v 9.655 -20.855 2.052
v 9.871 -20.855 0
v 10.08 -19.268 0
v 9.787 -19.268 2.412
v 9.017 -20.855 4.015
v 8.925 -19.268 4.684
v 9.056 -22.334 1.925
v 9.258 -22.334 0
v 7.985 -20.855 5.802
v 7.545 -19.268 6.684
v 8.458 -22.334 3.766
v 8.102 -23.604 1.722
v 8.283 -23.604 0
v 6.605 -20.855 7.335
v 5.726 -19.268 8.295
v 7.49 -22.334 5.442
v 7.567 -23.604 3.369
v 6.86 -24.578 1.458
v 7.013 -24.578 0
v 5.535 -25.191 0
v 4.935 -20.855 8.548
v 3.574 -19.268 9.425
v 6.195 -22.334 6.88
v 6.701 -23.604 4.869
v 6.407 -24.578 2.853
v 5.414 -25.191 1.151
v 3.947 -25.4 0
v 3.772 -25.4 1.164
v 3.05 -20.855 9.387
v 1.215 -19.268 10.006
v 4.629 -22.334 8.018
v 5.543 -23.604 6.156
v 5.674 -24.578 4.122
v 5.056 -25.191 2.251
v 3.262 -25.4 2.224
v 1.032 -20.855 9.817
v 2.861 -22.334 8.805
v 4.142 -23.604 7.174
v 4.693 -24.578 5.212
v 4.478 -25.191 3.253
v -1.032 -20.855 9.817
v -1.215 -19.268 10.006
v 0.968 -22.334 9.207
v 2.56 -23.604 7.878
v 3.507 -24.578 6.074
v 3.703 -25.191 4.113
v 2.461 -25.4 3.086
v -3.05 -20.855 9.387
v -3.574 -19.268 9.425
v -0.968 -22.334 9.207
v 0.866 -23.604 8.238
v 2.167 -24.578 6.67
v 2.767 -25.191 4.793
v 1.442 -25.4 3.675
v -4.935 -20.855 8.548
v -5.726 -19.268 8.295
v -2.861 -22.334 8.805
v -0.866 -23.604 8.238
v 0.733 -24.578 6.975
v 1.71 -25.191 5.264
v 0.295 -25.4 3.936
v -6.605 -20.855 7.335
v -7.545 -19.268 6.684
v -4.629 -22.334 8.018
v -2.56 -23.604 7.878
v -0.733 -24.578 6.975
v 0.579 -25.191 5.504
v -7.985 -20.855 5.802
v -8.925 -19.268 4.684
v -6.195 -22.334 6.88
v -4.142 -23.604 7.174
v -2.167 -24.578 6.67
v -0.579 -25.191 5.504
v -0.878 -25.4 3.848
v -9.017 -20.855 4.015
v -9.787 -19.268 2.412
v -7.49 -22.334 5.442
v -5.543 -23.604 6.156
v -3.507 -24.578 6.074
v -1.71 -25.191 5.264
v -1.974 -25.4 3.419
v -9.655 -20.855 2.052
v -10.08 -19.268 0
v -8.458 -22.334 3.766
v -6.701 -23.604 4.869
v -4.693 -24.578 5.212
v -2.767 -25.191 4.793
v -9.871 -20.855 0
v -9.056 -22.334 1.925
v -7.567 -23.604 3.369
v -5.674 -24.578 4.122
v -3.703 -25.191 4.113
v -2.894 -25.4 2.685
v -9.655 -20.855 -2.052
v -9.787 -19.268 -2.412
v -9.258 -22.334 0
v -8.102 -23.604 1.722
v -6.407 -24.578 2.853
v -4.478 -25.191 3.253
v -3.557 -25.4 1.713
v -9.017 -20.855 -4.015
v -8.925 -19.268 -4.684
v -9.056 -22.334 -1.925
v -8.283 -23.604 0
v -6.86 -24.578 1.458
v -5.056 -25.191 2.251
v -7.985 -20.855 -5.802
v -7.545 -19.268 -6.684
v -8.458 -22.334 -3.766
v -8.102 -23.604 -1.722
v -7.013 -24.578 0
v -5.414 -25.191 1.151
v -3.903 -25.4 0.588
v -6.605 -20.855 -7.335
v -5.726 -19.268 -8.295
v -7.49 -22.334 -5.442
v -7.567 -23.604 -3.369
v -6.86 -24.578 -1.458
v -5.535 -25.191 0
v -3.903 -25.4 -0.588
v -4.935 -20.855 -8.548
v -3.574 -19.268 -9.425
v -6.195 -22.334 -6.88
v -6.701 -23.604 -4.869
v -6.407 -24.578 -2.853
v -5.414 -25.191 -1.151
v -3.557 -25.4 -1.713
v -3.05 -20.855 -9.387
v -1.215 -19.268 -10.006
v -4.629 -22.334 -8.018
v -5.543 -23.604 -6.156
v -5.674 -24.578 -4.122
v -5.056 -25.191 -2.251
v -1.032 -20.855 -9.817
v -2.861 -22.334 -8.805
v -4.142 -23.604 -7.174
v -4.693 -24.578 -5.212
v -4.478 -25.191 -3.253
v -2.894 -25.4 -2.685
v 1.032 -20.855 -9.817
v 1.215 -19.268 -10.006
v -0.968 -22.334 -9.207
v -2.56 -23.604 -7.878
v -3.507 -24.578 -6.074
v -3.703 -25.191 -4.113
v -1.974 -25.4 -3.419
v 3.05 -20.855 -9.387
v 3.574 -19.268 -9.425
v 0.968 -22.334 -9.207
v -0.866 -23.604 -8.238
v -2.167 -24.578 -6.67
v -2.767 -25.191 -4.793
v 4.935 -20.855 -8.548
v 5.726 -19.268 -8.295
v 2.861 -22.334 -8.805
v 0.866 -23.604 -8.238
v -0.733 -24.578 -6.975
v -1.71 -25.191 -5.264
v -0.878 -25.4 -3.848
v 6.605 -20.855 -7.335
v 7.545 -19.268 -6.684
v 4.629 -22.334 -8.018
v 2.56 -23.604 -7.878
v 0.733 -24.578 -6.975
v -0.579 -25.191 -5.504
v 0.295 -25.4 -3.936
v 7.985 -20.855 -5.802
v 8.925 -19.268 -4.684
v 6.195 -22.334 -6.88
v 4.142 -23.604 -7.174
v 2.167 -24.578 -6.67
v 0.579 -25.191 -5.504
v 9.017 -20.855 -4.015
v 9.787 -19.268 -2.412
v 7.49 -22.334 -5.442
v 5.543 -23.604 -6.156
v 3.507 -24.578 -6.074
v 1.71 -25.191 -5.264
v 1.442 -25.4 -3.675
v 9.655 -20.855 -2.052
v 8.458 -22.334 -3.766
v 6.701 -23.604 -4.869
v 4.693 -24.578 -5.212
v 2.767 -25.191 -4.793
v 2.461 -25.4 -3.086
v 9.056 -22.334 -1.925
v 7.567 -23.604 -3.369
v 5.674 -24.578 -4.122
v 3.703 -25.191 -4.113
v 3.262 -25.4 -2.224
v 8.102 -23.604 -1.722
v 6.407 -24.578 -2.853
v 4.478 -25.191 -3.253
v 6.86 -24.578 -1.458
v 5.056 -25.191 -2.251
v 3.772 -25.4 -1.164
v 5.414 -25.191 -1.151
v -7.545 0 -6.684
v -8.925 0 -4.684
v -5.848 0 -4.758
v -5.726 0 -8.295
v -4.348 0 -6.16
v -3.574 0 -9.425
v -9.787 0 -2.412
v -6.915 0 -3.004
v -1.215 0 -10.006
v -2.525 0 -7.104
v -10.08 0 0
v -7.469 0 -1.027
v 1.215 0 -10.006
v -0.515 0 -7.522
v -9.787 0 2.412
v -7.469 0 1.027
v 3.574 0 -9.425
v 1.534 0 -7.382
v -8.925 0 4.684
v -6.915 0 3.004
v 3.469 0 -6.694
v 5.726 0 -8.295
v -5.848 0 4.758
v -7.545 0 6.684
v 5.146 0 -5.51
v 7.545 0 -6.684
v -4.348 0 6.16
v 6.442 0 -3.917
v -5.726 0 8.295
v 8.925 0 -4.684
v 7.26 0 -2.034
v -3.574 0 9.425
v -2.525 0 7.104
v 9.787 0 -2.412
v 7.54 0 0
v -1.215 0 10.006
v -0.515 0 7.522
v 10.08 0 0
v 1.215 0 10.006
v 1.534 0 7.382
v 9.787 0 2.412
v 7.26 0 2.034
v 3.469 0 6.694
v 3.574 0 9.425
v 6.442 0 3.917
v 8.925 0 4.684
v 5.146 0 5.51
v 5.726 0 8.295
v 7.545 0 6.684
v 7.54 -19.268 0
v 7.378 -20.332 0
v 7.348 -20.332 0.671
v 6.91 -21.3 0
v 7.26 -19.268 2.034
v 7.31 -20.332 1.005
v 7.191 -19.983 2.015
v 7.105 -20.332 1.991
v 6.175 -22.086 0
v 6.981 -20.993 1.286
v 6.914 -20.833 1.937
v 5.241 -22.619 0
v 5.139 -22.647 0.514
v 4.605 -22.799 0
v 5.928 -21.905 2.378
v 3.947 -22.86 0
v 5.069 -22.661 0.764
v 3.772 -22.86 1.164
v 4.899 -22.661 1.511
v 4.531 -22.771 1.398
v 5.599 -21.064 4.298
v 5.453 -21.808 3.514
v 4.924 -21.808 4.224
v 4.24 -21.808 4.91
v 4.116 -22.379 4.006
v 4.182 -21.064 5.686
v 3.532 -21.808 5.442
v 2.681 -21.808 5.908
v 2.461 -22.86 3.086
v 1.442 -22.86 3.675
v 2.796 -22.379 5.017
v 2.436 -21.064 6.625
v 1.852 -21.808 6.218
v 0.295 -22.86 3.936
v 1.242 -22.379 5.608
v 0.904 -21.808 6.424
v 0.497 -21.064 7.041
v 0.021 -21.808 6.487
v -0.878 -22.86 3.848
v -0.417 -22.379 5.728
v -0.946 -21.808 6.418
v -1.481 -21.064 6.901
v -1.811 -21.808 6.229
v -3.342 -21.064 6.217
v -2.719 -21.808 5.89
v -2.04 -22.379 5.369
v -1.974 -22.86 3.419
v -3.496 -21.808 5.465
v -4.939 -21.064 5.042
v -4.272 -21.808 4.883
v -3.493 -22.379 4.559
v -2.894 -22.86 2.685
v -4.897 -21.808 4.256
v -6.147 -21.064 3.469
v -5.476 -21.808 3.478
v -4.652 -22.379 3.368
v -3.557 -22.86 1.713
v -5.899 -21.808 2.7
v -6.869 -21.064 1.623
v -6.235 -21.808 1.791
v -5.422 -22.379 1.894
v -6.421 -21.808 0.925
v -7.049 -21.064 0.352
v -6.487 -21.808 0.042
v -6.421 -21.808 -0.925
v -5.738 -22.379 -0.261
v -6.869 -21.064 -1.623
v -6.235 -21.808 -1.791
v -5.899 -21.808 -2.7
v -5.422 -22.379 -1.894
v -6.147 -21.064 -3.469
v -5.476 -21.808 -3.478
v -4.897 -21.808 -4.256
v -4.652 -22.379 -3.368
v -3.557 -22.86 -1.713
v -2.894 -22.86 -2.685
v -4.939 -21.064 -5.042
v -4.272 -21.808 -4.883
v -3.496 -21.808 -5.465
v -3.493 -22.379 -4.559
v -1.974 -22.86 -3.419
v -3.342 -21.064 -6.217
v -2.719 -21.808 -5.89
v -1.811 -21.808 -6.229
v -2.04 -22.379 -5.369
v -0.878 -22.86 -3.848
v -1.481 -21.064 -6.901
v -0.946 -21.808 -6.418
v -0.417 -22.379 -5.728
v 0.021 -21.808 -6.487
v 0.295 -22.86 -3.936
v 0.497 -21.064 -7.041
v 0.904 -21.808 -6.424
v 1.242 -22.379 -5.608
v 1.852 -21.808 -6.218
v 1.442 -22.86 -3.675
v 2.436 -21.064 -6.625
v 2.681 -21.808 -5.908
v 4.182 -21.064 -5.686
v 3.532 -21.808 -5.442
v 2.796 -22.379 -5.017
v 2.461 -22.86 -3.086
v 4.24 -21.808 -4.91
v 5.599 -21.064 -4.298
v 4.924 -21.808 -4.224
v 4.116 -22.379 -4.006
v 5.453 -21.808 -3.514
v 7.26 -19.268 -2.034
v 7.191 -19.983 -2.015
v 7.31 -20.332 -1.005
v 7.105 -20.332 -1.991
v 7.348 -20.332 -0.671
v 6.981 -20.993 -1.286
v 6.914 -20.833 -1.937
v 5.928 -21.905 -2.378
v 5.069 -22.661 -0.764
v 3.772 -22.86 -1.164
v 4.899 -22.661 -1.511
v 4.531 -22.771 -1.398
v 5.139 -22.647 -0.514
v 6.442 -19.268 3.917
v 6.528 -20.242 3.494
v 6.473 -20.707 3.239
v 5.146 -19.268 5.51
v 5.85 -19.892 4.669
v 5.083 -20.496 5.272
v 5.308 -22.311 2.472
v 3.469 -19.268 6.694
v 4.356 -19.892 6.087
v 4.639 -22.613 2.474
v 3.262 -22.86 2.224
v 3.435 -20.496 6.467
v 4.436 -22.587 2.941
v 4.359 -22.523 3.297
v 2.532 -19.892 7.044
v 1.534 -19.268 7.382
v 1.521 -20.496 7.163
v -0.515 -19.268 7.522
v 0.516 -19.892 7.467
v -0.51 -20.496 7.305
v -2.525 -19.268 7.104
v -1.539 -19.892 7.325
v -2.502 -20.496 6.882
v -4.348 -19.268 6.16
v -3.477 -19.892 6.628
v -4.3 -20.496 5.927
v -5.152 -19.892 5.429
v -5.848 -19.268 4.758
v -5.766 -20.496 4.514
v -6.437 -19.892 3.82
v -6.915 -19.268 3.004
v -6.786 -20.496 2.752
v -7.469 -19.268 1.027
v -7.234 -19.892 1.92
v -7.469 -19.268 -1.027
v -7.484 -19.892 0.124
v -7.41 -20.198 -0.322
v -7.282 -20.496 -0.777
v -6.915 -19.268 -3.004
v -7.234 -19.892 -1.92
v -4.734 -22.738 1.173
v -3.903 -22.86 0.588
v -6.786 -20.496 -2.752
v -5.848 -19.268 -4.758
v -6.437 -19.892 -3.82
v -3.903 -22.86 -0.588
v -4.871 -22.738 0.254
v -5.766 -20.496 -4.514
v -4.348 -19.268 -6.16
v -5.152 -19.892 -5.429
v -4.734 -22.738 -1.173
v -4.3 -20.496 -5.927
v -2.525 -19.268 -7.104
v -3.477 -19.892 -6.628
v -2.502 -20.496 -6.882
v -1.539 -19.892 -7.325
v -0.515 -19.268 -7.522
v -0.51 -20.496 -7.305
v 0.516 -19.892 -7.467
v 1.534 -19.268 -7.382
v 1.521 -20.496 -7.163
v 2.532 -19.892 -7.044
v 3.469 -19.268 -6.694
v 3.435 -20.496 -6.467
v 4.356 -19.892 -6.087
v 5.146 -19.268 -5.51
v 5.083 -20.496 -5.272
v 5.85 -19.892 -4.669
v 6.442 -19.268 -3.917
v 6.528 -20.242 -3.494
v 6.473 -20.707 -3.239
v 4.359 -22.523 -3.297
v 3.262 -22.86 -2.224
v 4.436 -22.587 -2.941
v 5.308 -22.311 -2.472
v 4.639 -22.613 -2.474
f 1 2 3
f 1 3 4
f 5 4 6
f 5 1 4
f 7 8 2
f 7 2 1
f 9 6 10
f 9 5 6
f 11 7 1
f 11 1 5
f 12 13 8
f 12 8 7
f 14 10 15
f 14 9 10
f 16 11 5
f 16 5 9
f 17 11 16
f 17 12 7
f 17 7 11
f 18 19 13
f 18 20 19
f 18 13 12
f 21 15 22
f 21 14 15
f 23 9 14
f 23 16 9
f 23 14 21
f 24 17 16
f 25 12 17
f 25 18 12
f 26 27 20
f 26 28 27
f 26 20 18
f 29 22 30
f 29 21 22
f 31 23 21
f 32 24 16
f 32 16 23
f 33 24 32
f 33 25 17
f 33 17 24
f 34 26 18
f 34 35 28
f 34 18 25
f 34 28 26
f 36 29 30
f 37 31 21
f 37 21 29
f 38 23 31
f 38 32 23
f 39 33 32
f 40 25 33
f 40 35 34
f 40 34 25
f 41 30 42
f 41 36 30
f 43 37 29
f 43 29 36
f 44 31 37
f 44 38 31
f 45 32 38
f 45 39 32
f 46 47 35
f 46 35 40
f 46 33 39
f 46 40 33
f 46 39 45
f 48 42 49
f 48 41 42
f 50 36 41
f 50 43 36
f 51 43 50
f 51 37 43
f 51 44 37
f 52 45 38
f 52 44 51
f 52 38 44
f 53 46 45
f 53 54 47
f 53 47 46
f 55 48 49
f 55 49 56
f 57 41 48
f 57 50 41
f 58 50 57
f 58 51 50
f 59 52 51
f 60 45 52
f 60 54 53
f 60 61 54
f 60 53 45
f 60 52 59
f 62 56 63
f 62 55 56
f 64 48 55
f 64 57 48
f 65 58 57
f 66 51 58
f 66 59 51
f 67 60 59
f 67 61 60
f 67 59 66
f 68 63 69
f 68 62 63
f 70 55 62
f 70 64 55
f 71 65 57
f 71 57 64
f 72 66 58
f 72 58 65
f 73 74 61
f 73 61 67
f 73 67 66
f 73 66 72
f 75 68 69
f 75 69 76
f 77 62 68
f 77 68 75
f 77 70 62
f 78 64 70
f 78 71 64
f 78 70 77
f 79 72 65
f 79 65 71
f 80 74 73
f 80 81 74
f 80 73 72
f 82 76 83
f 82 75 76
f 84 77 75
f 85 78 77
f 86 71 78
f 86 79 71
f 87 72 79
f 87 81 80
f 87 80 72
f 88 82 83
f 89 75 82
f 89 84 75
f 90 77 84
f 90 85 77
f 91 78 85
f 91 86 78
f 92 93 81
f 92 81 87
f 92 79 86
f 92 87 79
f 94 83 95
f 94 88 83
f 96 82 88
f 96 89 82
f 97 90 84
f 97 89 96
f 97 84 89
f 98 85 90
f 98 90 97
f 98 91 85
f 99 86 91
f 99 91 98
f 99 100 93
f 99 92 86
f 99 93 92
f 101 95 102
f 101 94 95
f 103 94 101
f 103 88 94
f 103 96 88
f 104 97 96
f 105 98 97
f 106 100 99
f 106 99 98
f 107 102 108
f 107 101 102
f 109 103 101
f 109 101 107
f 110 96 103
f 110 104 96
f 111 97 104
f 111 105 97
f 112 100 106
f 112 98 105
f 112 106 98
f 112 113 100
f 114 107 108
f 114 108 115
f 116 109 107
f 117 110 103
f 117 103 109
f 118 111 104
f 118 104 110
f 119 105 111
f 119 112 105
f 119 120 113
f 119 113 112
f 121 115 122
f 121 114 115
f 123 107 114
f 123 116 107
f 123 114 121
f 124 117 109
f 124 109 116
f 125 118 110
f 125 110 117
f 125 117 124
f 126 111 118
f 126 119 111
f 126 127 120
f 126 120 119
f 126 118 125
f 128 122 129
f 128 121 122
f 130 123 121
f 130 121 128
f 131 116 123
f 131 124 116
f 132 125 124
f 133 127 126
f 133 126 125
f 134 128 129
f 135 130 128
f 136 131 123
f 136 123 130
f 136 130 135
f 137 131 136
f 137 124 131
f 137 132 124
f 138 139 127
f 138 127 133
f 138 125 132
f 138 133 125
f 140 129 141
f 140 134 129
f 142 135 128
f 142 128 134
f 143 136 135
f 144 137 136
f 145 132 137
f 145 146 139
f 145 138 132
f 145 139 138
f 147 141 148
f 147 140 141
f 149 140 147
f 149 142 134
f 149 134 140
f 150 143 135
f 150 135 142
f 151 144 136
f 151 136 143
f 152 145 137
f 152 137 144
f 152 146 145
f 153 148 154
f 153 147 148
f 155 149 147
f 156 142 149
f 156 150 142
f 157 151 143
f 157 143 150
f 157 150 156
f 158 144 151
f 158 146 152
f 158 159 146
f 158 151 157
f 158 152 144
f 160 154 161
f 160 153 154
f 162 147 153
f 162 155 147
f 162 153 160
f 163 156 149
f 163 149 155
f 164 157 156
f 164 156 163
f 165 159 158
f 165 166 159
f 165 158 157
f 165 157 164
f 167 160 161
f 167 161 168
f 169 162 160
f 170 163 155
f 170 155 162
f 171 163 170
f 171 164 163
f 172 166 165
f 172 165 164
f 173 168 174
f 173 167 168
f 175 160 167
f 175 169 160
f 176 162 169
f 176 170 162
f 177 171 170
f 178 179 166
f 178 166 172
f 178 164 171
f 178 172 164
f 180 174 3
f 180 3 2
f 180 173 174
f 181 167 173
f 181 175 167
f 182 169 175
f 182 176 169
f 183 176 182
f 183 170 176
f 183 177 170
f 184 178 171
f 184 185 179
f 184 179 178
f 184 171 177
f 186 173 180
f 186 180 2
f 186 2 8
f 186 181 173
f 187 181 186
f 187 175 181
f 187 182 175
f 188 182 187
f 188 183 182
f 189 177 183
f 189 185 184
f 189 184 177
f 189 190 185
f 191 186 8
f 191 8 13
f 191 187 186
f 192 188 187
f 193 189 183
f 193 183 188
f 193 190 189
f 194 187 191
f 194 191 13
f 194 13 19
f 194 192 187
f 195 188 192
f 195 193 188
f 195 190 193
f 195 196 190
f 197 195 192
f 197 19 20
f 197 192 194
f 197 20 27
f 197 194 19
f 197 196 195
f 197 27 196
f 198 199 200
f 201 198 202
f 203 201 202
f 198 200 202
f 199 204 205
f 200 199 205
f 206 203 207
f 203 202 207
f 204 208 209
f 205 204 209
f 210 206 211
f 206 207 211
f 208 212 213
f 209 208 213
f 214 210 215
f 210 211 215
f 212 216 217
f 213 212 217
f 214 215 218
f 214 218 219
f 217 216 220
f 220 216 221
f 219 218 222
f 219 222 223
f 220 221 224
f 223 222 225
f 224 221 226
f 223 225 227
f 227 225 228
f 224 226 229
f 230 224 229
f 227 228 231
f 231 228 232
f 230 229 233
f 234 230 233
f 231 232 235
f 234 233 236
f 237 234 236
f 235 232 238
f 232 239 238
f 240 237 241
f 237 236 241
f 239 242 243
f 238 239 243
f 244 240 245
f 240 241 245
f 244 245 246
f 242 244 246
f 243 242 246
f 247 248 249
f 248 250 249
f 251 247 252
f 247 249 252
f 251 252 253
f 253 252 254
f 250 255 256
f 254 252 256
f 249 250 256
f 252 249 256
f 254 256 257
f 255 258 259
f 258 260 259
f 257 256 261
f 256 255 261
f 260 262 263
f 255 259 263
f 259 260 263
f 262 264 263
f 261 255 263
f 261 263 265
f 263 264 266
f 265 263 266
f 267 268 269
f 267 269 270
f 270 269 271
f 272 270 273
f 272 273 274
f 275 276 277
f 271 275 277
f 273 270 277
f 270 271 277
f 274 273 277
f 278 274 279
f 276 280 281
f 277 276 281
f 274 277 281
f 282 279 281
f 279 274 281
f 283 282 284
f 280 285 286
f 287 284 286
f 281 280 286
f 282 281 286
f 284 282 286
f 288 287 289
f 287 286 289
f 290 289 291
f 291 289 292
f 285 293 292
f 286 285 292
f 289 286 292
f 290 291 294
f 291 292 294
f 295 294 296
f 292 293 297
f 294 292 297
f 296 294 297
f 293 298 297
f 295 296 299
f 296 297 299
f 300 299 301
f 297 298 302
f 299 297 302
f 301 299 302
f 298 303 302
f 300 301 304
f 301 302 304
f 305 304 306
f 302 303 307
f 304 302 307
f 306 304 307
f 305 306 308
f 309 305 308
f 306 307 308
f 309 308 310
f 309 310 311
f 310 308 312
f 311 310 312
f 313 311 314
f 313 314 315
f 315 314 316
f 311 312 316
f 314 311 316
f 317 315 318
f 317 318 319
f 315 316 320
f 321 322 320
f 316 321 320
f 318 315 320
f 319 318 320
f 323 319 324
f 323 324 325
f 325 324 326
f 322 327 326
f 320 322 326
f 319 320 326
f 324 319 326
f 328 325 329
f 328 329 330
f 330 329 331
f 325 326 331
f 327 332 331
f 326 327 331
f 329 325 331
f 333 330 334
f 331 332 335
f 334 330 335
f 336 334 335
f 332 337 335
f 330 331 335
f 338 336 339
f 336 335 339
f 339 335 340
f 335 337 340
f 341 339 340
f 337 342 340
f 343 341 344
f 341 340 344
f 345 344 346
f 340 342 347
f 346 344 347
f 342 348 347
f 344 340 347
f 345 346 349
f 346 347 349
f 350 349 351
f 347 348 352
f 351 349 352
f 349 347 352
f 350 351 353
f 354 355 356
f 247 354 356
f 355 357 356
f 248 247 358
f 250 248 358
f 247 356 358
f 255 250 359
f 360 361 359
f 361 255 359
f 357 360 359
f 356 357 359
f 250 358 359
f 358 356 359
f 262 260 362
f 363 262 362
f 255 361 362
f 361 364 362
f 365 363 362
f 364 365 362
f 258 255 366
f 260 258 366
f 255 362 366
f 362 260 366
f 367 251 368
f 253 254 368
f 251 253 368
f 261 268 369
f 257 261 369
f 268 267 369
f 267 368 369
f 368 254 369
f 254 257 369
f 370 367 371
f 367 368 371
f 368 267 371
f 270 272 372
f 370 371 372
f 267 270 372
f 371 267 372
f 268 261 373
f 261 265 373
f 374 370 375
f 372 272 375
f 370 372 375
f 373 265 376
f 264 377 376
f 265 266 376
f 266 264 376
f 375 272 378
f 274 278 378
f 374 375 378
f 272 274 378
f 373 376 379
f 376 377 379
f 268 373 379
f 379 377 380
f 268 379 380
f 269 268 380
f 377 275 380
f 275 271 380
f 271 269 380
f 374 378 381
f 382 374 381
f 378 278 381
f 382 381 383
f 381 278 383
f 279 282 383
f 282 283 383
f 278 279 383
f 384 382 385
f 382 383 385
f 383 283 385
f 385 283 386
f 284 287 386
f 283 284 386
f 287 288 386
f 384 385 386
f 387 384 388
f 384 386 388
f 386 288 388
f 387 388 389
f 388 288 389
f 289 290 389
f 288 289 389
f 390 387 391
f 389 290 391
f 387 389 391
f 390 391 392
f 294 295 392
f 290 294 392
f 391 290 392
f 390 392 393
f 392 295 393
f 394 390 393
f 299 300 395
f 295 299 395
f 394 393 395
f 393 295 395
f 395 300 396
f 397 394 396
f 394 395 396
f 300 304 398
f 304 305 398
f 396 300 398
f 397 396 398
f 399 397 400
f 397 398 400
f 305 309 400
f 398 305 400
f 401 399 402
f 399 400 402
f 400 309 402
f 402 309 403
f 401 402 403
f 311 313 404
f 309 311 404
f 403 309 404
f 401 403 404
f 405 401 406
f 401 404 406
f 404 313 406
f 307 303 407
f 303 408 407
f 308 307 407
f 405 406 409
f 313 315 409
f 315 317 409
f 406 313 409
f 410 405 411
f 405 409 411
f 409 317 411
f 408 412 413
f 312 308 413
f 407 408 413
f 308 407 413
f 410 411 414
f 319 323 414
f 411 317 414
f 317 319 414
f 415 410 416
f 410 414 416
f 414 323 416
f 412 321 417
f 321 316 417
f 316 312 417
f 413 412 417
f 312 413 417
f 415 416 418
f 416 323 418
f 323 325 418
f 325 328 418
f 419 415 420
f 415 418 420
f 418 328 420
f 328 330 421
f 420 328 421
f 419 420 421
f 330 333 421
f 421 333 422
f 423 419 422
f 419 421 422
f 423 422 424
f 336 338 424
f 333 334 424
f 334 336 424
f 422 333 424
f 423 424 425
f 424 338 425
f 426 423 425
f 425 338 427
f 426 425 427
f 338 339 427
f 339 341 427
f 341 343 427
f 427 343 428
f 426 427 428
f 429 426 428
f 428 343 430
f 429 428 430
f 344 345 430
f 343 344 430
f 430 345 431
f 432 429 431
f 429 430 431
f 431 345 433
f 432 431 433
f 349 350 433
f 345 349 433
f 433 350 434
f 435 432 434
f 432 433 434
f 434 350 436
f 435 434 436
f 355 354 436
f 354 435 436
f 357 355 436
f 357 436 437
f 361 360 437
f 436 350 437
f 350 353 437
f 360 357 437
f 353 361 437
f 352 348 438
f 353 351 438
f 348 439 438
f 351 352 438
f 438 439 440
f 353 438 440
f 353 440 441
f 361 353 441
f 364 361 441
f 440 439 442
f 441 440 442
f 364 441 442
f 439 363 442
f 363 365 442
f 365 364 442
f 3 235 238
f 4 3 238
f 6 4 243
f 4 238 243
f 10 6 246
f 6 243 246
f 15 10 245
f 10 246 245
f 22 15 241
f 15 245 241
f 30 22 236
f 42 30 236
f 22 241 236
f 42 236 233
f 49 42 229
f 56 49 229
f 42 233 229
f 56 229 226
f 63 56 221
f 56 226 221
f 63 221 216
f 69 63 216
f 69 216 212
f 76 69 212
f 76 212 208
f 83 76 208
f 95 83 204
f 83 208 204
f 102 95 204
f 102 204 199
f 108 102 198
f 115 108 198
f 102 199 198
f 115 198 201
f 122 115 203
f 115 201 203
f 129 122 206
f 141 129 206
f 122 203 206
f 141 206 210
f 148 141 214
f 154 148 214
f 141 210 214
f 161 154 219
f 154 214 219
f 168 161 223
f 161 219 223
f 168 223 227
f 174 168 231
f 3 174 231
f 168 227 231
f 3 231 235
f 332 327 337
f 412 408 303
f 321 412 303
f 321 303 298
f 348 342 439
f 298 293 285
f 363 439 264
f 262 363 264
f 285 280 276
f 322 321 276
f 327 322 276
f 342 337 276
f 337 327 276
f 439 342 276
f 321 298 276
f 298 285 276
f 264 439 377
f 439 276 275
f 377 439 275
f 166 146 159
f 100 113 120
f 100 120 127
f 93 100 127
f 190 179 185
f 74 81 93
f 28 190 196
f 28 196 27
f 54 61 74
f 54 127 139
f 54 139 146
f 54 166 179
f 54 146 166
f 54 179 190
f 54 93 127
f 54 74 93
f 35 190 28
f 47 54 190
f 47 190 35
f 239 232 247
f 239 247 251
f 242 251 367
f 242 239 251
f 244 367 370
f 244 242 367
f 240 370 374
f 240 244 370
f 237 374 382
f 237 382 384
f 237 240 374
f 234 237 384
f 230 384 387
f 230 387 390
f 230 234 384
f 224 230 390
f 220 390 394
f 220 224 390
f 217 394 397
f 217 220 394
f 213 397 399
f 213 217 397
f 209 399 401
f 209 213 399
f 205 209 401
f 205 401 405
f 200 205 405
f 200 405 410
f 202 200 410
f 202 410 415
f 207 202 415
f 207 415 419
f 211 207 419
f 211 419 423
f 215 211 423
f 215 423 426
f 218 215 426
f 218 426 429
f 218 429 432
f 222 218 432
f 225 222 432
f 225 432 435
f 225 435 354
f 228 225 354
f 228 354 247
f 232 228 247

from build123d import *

# Parameters (mm, degrees)
F0_R     = 10.079521
F1_DEPTH = 25.4
F2_R     = 6.132102
F3_T     = -2.54


with BuildPart() as f1:
    # F0 (on Front) → F1 (new body)
    with BuildSketch(Plane.XZ):
        Circle(F0_R)
    extrude(amount=F1_DEPTH)

    # F2
    f2_edges = [f1.edges().sort_by_distance(p)[0] for p in [
        (-10.079521, -25.4, 0),
    ]]
    fillet(f2_edges, radius=F2_R)

    # F3
    f3_openings = [f1.faces().sort_by_distance(p)[0] for p in [
        (0, 0, 0),
    ]]
    offset(amount=F3_T, openings=f3_openings)


solid = f1.part
